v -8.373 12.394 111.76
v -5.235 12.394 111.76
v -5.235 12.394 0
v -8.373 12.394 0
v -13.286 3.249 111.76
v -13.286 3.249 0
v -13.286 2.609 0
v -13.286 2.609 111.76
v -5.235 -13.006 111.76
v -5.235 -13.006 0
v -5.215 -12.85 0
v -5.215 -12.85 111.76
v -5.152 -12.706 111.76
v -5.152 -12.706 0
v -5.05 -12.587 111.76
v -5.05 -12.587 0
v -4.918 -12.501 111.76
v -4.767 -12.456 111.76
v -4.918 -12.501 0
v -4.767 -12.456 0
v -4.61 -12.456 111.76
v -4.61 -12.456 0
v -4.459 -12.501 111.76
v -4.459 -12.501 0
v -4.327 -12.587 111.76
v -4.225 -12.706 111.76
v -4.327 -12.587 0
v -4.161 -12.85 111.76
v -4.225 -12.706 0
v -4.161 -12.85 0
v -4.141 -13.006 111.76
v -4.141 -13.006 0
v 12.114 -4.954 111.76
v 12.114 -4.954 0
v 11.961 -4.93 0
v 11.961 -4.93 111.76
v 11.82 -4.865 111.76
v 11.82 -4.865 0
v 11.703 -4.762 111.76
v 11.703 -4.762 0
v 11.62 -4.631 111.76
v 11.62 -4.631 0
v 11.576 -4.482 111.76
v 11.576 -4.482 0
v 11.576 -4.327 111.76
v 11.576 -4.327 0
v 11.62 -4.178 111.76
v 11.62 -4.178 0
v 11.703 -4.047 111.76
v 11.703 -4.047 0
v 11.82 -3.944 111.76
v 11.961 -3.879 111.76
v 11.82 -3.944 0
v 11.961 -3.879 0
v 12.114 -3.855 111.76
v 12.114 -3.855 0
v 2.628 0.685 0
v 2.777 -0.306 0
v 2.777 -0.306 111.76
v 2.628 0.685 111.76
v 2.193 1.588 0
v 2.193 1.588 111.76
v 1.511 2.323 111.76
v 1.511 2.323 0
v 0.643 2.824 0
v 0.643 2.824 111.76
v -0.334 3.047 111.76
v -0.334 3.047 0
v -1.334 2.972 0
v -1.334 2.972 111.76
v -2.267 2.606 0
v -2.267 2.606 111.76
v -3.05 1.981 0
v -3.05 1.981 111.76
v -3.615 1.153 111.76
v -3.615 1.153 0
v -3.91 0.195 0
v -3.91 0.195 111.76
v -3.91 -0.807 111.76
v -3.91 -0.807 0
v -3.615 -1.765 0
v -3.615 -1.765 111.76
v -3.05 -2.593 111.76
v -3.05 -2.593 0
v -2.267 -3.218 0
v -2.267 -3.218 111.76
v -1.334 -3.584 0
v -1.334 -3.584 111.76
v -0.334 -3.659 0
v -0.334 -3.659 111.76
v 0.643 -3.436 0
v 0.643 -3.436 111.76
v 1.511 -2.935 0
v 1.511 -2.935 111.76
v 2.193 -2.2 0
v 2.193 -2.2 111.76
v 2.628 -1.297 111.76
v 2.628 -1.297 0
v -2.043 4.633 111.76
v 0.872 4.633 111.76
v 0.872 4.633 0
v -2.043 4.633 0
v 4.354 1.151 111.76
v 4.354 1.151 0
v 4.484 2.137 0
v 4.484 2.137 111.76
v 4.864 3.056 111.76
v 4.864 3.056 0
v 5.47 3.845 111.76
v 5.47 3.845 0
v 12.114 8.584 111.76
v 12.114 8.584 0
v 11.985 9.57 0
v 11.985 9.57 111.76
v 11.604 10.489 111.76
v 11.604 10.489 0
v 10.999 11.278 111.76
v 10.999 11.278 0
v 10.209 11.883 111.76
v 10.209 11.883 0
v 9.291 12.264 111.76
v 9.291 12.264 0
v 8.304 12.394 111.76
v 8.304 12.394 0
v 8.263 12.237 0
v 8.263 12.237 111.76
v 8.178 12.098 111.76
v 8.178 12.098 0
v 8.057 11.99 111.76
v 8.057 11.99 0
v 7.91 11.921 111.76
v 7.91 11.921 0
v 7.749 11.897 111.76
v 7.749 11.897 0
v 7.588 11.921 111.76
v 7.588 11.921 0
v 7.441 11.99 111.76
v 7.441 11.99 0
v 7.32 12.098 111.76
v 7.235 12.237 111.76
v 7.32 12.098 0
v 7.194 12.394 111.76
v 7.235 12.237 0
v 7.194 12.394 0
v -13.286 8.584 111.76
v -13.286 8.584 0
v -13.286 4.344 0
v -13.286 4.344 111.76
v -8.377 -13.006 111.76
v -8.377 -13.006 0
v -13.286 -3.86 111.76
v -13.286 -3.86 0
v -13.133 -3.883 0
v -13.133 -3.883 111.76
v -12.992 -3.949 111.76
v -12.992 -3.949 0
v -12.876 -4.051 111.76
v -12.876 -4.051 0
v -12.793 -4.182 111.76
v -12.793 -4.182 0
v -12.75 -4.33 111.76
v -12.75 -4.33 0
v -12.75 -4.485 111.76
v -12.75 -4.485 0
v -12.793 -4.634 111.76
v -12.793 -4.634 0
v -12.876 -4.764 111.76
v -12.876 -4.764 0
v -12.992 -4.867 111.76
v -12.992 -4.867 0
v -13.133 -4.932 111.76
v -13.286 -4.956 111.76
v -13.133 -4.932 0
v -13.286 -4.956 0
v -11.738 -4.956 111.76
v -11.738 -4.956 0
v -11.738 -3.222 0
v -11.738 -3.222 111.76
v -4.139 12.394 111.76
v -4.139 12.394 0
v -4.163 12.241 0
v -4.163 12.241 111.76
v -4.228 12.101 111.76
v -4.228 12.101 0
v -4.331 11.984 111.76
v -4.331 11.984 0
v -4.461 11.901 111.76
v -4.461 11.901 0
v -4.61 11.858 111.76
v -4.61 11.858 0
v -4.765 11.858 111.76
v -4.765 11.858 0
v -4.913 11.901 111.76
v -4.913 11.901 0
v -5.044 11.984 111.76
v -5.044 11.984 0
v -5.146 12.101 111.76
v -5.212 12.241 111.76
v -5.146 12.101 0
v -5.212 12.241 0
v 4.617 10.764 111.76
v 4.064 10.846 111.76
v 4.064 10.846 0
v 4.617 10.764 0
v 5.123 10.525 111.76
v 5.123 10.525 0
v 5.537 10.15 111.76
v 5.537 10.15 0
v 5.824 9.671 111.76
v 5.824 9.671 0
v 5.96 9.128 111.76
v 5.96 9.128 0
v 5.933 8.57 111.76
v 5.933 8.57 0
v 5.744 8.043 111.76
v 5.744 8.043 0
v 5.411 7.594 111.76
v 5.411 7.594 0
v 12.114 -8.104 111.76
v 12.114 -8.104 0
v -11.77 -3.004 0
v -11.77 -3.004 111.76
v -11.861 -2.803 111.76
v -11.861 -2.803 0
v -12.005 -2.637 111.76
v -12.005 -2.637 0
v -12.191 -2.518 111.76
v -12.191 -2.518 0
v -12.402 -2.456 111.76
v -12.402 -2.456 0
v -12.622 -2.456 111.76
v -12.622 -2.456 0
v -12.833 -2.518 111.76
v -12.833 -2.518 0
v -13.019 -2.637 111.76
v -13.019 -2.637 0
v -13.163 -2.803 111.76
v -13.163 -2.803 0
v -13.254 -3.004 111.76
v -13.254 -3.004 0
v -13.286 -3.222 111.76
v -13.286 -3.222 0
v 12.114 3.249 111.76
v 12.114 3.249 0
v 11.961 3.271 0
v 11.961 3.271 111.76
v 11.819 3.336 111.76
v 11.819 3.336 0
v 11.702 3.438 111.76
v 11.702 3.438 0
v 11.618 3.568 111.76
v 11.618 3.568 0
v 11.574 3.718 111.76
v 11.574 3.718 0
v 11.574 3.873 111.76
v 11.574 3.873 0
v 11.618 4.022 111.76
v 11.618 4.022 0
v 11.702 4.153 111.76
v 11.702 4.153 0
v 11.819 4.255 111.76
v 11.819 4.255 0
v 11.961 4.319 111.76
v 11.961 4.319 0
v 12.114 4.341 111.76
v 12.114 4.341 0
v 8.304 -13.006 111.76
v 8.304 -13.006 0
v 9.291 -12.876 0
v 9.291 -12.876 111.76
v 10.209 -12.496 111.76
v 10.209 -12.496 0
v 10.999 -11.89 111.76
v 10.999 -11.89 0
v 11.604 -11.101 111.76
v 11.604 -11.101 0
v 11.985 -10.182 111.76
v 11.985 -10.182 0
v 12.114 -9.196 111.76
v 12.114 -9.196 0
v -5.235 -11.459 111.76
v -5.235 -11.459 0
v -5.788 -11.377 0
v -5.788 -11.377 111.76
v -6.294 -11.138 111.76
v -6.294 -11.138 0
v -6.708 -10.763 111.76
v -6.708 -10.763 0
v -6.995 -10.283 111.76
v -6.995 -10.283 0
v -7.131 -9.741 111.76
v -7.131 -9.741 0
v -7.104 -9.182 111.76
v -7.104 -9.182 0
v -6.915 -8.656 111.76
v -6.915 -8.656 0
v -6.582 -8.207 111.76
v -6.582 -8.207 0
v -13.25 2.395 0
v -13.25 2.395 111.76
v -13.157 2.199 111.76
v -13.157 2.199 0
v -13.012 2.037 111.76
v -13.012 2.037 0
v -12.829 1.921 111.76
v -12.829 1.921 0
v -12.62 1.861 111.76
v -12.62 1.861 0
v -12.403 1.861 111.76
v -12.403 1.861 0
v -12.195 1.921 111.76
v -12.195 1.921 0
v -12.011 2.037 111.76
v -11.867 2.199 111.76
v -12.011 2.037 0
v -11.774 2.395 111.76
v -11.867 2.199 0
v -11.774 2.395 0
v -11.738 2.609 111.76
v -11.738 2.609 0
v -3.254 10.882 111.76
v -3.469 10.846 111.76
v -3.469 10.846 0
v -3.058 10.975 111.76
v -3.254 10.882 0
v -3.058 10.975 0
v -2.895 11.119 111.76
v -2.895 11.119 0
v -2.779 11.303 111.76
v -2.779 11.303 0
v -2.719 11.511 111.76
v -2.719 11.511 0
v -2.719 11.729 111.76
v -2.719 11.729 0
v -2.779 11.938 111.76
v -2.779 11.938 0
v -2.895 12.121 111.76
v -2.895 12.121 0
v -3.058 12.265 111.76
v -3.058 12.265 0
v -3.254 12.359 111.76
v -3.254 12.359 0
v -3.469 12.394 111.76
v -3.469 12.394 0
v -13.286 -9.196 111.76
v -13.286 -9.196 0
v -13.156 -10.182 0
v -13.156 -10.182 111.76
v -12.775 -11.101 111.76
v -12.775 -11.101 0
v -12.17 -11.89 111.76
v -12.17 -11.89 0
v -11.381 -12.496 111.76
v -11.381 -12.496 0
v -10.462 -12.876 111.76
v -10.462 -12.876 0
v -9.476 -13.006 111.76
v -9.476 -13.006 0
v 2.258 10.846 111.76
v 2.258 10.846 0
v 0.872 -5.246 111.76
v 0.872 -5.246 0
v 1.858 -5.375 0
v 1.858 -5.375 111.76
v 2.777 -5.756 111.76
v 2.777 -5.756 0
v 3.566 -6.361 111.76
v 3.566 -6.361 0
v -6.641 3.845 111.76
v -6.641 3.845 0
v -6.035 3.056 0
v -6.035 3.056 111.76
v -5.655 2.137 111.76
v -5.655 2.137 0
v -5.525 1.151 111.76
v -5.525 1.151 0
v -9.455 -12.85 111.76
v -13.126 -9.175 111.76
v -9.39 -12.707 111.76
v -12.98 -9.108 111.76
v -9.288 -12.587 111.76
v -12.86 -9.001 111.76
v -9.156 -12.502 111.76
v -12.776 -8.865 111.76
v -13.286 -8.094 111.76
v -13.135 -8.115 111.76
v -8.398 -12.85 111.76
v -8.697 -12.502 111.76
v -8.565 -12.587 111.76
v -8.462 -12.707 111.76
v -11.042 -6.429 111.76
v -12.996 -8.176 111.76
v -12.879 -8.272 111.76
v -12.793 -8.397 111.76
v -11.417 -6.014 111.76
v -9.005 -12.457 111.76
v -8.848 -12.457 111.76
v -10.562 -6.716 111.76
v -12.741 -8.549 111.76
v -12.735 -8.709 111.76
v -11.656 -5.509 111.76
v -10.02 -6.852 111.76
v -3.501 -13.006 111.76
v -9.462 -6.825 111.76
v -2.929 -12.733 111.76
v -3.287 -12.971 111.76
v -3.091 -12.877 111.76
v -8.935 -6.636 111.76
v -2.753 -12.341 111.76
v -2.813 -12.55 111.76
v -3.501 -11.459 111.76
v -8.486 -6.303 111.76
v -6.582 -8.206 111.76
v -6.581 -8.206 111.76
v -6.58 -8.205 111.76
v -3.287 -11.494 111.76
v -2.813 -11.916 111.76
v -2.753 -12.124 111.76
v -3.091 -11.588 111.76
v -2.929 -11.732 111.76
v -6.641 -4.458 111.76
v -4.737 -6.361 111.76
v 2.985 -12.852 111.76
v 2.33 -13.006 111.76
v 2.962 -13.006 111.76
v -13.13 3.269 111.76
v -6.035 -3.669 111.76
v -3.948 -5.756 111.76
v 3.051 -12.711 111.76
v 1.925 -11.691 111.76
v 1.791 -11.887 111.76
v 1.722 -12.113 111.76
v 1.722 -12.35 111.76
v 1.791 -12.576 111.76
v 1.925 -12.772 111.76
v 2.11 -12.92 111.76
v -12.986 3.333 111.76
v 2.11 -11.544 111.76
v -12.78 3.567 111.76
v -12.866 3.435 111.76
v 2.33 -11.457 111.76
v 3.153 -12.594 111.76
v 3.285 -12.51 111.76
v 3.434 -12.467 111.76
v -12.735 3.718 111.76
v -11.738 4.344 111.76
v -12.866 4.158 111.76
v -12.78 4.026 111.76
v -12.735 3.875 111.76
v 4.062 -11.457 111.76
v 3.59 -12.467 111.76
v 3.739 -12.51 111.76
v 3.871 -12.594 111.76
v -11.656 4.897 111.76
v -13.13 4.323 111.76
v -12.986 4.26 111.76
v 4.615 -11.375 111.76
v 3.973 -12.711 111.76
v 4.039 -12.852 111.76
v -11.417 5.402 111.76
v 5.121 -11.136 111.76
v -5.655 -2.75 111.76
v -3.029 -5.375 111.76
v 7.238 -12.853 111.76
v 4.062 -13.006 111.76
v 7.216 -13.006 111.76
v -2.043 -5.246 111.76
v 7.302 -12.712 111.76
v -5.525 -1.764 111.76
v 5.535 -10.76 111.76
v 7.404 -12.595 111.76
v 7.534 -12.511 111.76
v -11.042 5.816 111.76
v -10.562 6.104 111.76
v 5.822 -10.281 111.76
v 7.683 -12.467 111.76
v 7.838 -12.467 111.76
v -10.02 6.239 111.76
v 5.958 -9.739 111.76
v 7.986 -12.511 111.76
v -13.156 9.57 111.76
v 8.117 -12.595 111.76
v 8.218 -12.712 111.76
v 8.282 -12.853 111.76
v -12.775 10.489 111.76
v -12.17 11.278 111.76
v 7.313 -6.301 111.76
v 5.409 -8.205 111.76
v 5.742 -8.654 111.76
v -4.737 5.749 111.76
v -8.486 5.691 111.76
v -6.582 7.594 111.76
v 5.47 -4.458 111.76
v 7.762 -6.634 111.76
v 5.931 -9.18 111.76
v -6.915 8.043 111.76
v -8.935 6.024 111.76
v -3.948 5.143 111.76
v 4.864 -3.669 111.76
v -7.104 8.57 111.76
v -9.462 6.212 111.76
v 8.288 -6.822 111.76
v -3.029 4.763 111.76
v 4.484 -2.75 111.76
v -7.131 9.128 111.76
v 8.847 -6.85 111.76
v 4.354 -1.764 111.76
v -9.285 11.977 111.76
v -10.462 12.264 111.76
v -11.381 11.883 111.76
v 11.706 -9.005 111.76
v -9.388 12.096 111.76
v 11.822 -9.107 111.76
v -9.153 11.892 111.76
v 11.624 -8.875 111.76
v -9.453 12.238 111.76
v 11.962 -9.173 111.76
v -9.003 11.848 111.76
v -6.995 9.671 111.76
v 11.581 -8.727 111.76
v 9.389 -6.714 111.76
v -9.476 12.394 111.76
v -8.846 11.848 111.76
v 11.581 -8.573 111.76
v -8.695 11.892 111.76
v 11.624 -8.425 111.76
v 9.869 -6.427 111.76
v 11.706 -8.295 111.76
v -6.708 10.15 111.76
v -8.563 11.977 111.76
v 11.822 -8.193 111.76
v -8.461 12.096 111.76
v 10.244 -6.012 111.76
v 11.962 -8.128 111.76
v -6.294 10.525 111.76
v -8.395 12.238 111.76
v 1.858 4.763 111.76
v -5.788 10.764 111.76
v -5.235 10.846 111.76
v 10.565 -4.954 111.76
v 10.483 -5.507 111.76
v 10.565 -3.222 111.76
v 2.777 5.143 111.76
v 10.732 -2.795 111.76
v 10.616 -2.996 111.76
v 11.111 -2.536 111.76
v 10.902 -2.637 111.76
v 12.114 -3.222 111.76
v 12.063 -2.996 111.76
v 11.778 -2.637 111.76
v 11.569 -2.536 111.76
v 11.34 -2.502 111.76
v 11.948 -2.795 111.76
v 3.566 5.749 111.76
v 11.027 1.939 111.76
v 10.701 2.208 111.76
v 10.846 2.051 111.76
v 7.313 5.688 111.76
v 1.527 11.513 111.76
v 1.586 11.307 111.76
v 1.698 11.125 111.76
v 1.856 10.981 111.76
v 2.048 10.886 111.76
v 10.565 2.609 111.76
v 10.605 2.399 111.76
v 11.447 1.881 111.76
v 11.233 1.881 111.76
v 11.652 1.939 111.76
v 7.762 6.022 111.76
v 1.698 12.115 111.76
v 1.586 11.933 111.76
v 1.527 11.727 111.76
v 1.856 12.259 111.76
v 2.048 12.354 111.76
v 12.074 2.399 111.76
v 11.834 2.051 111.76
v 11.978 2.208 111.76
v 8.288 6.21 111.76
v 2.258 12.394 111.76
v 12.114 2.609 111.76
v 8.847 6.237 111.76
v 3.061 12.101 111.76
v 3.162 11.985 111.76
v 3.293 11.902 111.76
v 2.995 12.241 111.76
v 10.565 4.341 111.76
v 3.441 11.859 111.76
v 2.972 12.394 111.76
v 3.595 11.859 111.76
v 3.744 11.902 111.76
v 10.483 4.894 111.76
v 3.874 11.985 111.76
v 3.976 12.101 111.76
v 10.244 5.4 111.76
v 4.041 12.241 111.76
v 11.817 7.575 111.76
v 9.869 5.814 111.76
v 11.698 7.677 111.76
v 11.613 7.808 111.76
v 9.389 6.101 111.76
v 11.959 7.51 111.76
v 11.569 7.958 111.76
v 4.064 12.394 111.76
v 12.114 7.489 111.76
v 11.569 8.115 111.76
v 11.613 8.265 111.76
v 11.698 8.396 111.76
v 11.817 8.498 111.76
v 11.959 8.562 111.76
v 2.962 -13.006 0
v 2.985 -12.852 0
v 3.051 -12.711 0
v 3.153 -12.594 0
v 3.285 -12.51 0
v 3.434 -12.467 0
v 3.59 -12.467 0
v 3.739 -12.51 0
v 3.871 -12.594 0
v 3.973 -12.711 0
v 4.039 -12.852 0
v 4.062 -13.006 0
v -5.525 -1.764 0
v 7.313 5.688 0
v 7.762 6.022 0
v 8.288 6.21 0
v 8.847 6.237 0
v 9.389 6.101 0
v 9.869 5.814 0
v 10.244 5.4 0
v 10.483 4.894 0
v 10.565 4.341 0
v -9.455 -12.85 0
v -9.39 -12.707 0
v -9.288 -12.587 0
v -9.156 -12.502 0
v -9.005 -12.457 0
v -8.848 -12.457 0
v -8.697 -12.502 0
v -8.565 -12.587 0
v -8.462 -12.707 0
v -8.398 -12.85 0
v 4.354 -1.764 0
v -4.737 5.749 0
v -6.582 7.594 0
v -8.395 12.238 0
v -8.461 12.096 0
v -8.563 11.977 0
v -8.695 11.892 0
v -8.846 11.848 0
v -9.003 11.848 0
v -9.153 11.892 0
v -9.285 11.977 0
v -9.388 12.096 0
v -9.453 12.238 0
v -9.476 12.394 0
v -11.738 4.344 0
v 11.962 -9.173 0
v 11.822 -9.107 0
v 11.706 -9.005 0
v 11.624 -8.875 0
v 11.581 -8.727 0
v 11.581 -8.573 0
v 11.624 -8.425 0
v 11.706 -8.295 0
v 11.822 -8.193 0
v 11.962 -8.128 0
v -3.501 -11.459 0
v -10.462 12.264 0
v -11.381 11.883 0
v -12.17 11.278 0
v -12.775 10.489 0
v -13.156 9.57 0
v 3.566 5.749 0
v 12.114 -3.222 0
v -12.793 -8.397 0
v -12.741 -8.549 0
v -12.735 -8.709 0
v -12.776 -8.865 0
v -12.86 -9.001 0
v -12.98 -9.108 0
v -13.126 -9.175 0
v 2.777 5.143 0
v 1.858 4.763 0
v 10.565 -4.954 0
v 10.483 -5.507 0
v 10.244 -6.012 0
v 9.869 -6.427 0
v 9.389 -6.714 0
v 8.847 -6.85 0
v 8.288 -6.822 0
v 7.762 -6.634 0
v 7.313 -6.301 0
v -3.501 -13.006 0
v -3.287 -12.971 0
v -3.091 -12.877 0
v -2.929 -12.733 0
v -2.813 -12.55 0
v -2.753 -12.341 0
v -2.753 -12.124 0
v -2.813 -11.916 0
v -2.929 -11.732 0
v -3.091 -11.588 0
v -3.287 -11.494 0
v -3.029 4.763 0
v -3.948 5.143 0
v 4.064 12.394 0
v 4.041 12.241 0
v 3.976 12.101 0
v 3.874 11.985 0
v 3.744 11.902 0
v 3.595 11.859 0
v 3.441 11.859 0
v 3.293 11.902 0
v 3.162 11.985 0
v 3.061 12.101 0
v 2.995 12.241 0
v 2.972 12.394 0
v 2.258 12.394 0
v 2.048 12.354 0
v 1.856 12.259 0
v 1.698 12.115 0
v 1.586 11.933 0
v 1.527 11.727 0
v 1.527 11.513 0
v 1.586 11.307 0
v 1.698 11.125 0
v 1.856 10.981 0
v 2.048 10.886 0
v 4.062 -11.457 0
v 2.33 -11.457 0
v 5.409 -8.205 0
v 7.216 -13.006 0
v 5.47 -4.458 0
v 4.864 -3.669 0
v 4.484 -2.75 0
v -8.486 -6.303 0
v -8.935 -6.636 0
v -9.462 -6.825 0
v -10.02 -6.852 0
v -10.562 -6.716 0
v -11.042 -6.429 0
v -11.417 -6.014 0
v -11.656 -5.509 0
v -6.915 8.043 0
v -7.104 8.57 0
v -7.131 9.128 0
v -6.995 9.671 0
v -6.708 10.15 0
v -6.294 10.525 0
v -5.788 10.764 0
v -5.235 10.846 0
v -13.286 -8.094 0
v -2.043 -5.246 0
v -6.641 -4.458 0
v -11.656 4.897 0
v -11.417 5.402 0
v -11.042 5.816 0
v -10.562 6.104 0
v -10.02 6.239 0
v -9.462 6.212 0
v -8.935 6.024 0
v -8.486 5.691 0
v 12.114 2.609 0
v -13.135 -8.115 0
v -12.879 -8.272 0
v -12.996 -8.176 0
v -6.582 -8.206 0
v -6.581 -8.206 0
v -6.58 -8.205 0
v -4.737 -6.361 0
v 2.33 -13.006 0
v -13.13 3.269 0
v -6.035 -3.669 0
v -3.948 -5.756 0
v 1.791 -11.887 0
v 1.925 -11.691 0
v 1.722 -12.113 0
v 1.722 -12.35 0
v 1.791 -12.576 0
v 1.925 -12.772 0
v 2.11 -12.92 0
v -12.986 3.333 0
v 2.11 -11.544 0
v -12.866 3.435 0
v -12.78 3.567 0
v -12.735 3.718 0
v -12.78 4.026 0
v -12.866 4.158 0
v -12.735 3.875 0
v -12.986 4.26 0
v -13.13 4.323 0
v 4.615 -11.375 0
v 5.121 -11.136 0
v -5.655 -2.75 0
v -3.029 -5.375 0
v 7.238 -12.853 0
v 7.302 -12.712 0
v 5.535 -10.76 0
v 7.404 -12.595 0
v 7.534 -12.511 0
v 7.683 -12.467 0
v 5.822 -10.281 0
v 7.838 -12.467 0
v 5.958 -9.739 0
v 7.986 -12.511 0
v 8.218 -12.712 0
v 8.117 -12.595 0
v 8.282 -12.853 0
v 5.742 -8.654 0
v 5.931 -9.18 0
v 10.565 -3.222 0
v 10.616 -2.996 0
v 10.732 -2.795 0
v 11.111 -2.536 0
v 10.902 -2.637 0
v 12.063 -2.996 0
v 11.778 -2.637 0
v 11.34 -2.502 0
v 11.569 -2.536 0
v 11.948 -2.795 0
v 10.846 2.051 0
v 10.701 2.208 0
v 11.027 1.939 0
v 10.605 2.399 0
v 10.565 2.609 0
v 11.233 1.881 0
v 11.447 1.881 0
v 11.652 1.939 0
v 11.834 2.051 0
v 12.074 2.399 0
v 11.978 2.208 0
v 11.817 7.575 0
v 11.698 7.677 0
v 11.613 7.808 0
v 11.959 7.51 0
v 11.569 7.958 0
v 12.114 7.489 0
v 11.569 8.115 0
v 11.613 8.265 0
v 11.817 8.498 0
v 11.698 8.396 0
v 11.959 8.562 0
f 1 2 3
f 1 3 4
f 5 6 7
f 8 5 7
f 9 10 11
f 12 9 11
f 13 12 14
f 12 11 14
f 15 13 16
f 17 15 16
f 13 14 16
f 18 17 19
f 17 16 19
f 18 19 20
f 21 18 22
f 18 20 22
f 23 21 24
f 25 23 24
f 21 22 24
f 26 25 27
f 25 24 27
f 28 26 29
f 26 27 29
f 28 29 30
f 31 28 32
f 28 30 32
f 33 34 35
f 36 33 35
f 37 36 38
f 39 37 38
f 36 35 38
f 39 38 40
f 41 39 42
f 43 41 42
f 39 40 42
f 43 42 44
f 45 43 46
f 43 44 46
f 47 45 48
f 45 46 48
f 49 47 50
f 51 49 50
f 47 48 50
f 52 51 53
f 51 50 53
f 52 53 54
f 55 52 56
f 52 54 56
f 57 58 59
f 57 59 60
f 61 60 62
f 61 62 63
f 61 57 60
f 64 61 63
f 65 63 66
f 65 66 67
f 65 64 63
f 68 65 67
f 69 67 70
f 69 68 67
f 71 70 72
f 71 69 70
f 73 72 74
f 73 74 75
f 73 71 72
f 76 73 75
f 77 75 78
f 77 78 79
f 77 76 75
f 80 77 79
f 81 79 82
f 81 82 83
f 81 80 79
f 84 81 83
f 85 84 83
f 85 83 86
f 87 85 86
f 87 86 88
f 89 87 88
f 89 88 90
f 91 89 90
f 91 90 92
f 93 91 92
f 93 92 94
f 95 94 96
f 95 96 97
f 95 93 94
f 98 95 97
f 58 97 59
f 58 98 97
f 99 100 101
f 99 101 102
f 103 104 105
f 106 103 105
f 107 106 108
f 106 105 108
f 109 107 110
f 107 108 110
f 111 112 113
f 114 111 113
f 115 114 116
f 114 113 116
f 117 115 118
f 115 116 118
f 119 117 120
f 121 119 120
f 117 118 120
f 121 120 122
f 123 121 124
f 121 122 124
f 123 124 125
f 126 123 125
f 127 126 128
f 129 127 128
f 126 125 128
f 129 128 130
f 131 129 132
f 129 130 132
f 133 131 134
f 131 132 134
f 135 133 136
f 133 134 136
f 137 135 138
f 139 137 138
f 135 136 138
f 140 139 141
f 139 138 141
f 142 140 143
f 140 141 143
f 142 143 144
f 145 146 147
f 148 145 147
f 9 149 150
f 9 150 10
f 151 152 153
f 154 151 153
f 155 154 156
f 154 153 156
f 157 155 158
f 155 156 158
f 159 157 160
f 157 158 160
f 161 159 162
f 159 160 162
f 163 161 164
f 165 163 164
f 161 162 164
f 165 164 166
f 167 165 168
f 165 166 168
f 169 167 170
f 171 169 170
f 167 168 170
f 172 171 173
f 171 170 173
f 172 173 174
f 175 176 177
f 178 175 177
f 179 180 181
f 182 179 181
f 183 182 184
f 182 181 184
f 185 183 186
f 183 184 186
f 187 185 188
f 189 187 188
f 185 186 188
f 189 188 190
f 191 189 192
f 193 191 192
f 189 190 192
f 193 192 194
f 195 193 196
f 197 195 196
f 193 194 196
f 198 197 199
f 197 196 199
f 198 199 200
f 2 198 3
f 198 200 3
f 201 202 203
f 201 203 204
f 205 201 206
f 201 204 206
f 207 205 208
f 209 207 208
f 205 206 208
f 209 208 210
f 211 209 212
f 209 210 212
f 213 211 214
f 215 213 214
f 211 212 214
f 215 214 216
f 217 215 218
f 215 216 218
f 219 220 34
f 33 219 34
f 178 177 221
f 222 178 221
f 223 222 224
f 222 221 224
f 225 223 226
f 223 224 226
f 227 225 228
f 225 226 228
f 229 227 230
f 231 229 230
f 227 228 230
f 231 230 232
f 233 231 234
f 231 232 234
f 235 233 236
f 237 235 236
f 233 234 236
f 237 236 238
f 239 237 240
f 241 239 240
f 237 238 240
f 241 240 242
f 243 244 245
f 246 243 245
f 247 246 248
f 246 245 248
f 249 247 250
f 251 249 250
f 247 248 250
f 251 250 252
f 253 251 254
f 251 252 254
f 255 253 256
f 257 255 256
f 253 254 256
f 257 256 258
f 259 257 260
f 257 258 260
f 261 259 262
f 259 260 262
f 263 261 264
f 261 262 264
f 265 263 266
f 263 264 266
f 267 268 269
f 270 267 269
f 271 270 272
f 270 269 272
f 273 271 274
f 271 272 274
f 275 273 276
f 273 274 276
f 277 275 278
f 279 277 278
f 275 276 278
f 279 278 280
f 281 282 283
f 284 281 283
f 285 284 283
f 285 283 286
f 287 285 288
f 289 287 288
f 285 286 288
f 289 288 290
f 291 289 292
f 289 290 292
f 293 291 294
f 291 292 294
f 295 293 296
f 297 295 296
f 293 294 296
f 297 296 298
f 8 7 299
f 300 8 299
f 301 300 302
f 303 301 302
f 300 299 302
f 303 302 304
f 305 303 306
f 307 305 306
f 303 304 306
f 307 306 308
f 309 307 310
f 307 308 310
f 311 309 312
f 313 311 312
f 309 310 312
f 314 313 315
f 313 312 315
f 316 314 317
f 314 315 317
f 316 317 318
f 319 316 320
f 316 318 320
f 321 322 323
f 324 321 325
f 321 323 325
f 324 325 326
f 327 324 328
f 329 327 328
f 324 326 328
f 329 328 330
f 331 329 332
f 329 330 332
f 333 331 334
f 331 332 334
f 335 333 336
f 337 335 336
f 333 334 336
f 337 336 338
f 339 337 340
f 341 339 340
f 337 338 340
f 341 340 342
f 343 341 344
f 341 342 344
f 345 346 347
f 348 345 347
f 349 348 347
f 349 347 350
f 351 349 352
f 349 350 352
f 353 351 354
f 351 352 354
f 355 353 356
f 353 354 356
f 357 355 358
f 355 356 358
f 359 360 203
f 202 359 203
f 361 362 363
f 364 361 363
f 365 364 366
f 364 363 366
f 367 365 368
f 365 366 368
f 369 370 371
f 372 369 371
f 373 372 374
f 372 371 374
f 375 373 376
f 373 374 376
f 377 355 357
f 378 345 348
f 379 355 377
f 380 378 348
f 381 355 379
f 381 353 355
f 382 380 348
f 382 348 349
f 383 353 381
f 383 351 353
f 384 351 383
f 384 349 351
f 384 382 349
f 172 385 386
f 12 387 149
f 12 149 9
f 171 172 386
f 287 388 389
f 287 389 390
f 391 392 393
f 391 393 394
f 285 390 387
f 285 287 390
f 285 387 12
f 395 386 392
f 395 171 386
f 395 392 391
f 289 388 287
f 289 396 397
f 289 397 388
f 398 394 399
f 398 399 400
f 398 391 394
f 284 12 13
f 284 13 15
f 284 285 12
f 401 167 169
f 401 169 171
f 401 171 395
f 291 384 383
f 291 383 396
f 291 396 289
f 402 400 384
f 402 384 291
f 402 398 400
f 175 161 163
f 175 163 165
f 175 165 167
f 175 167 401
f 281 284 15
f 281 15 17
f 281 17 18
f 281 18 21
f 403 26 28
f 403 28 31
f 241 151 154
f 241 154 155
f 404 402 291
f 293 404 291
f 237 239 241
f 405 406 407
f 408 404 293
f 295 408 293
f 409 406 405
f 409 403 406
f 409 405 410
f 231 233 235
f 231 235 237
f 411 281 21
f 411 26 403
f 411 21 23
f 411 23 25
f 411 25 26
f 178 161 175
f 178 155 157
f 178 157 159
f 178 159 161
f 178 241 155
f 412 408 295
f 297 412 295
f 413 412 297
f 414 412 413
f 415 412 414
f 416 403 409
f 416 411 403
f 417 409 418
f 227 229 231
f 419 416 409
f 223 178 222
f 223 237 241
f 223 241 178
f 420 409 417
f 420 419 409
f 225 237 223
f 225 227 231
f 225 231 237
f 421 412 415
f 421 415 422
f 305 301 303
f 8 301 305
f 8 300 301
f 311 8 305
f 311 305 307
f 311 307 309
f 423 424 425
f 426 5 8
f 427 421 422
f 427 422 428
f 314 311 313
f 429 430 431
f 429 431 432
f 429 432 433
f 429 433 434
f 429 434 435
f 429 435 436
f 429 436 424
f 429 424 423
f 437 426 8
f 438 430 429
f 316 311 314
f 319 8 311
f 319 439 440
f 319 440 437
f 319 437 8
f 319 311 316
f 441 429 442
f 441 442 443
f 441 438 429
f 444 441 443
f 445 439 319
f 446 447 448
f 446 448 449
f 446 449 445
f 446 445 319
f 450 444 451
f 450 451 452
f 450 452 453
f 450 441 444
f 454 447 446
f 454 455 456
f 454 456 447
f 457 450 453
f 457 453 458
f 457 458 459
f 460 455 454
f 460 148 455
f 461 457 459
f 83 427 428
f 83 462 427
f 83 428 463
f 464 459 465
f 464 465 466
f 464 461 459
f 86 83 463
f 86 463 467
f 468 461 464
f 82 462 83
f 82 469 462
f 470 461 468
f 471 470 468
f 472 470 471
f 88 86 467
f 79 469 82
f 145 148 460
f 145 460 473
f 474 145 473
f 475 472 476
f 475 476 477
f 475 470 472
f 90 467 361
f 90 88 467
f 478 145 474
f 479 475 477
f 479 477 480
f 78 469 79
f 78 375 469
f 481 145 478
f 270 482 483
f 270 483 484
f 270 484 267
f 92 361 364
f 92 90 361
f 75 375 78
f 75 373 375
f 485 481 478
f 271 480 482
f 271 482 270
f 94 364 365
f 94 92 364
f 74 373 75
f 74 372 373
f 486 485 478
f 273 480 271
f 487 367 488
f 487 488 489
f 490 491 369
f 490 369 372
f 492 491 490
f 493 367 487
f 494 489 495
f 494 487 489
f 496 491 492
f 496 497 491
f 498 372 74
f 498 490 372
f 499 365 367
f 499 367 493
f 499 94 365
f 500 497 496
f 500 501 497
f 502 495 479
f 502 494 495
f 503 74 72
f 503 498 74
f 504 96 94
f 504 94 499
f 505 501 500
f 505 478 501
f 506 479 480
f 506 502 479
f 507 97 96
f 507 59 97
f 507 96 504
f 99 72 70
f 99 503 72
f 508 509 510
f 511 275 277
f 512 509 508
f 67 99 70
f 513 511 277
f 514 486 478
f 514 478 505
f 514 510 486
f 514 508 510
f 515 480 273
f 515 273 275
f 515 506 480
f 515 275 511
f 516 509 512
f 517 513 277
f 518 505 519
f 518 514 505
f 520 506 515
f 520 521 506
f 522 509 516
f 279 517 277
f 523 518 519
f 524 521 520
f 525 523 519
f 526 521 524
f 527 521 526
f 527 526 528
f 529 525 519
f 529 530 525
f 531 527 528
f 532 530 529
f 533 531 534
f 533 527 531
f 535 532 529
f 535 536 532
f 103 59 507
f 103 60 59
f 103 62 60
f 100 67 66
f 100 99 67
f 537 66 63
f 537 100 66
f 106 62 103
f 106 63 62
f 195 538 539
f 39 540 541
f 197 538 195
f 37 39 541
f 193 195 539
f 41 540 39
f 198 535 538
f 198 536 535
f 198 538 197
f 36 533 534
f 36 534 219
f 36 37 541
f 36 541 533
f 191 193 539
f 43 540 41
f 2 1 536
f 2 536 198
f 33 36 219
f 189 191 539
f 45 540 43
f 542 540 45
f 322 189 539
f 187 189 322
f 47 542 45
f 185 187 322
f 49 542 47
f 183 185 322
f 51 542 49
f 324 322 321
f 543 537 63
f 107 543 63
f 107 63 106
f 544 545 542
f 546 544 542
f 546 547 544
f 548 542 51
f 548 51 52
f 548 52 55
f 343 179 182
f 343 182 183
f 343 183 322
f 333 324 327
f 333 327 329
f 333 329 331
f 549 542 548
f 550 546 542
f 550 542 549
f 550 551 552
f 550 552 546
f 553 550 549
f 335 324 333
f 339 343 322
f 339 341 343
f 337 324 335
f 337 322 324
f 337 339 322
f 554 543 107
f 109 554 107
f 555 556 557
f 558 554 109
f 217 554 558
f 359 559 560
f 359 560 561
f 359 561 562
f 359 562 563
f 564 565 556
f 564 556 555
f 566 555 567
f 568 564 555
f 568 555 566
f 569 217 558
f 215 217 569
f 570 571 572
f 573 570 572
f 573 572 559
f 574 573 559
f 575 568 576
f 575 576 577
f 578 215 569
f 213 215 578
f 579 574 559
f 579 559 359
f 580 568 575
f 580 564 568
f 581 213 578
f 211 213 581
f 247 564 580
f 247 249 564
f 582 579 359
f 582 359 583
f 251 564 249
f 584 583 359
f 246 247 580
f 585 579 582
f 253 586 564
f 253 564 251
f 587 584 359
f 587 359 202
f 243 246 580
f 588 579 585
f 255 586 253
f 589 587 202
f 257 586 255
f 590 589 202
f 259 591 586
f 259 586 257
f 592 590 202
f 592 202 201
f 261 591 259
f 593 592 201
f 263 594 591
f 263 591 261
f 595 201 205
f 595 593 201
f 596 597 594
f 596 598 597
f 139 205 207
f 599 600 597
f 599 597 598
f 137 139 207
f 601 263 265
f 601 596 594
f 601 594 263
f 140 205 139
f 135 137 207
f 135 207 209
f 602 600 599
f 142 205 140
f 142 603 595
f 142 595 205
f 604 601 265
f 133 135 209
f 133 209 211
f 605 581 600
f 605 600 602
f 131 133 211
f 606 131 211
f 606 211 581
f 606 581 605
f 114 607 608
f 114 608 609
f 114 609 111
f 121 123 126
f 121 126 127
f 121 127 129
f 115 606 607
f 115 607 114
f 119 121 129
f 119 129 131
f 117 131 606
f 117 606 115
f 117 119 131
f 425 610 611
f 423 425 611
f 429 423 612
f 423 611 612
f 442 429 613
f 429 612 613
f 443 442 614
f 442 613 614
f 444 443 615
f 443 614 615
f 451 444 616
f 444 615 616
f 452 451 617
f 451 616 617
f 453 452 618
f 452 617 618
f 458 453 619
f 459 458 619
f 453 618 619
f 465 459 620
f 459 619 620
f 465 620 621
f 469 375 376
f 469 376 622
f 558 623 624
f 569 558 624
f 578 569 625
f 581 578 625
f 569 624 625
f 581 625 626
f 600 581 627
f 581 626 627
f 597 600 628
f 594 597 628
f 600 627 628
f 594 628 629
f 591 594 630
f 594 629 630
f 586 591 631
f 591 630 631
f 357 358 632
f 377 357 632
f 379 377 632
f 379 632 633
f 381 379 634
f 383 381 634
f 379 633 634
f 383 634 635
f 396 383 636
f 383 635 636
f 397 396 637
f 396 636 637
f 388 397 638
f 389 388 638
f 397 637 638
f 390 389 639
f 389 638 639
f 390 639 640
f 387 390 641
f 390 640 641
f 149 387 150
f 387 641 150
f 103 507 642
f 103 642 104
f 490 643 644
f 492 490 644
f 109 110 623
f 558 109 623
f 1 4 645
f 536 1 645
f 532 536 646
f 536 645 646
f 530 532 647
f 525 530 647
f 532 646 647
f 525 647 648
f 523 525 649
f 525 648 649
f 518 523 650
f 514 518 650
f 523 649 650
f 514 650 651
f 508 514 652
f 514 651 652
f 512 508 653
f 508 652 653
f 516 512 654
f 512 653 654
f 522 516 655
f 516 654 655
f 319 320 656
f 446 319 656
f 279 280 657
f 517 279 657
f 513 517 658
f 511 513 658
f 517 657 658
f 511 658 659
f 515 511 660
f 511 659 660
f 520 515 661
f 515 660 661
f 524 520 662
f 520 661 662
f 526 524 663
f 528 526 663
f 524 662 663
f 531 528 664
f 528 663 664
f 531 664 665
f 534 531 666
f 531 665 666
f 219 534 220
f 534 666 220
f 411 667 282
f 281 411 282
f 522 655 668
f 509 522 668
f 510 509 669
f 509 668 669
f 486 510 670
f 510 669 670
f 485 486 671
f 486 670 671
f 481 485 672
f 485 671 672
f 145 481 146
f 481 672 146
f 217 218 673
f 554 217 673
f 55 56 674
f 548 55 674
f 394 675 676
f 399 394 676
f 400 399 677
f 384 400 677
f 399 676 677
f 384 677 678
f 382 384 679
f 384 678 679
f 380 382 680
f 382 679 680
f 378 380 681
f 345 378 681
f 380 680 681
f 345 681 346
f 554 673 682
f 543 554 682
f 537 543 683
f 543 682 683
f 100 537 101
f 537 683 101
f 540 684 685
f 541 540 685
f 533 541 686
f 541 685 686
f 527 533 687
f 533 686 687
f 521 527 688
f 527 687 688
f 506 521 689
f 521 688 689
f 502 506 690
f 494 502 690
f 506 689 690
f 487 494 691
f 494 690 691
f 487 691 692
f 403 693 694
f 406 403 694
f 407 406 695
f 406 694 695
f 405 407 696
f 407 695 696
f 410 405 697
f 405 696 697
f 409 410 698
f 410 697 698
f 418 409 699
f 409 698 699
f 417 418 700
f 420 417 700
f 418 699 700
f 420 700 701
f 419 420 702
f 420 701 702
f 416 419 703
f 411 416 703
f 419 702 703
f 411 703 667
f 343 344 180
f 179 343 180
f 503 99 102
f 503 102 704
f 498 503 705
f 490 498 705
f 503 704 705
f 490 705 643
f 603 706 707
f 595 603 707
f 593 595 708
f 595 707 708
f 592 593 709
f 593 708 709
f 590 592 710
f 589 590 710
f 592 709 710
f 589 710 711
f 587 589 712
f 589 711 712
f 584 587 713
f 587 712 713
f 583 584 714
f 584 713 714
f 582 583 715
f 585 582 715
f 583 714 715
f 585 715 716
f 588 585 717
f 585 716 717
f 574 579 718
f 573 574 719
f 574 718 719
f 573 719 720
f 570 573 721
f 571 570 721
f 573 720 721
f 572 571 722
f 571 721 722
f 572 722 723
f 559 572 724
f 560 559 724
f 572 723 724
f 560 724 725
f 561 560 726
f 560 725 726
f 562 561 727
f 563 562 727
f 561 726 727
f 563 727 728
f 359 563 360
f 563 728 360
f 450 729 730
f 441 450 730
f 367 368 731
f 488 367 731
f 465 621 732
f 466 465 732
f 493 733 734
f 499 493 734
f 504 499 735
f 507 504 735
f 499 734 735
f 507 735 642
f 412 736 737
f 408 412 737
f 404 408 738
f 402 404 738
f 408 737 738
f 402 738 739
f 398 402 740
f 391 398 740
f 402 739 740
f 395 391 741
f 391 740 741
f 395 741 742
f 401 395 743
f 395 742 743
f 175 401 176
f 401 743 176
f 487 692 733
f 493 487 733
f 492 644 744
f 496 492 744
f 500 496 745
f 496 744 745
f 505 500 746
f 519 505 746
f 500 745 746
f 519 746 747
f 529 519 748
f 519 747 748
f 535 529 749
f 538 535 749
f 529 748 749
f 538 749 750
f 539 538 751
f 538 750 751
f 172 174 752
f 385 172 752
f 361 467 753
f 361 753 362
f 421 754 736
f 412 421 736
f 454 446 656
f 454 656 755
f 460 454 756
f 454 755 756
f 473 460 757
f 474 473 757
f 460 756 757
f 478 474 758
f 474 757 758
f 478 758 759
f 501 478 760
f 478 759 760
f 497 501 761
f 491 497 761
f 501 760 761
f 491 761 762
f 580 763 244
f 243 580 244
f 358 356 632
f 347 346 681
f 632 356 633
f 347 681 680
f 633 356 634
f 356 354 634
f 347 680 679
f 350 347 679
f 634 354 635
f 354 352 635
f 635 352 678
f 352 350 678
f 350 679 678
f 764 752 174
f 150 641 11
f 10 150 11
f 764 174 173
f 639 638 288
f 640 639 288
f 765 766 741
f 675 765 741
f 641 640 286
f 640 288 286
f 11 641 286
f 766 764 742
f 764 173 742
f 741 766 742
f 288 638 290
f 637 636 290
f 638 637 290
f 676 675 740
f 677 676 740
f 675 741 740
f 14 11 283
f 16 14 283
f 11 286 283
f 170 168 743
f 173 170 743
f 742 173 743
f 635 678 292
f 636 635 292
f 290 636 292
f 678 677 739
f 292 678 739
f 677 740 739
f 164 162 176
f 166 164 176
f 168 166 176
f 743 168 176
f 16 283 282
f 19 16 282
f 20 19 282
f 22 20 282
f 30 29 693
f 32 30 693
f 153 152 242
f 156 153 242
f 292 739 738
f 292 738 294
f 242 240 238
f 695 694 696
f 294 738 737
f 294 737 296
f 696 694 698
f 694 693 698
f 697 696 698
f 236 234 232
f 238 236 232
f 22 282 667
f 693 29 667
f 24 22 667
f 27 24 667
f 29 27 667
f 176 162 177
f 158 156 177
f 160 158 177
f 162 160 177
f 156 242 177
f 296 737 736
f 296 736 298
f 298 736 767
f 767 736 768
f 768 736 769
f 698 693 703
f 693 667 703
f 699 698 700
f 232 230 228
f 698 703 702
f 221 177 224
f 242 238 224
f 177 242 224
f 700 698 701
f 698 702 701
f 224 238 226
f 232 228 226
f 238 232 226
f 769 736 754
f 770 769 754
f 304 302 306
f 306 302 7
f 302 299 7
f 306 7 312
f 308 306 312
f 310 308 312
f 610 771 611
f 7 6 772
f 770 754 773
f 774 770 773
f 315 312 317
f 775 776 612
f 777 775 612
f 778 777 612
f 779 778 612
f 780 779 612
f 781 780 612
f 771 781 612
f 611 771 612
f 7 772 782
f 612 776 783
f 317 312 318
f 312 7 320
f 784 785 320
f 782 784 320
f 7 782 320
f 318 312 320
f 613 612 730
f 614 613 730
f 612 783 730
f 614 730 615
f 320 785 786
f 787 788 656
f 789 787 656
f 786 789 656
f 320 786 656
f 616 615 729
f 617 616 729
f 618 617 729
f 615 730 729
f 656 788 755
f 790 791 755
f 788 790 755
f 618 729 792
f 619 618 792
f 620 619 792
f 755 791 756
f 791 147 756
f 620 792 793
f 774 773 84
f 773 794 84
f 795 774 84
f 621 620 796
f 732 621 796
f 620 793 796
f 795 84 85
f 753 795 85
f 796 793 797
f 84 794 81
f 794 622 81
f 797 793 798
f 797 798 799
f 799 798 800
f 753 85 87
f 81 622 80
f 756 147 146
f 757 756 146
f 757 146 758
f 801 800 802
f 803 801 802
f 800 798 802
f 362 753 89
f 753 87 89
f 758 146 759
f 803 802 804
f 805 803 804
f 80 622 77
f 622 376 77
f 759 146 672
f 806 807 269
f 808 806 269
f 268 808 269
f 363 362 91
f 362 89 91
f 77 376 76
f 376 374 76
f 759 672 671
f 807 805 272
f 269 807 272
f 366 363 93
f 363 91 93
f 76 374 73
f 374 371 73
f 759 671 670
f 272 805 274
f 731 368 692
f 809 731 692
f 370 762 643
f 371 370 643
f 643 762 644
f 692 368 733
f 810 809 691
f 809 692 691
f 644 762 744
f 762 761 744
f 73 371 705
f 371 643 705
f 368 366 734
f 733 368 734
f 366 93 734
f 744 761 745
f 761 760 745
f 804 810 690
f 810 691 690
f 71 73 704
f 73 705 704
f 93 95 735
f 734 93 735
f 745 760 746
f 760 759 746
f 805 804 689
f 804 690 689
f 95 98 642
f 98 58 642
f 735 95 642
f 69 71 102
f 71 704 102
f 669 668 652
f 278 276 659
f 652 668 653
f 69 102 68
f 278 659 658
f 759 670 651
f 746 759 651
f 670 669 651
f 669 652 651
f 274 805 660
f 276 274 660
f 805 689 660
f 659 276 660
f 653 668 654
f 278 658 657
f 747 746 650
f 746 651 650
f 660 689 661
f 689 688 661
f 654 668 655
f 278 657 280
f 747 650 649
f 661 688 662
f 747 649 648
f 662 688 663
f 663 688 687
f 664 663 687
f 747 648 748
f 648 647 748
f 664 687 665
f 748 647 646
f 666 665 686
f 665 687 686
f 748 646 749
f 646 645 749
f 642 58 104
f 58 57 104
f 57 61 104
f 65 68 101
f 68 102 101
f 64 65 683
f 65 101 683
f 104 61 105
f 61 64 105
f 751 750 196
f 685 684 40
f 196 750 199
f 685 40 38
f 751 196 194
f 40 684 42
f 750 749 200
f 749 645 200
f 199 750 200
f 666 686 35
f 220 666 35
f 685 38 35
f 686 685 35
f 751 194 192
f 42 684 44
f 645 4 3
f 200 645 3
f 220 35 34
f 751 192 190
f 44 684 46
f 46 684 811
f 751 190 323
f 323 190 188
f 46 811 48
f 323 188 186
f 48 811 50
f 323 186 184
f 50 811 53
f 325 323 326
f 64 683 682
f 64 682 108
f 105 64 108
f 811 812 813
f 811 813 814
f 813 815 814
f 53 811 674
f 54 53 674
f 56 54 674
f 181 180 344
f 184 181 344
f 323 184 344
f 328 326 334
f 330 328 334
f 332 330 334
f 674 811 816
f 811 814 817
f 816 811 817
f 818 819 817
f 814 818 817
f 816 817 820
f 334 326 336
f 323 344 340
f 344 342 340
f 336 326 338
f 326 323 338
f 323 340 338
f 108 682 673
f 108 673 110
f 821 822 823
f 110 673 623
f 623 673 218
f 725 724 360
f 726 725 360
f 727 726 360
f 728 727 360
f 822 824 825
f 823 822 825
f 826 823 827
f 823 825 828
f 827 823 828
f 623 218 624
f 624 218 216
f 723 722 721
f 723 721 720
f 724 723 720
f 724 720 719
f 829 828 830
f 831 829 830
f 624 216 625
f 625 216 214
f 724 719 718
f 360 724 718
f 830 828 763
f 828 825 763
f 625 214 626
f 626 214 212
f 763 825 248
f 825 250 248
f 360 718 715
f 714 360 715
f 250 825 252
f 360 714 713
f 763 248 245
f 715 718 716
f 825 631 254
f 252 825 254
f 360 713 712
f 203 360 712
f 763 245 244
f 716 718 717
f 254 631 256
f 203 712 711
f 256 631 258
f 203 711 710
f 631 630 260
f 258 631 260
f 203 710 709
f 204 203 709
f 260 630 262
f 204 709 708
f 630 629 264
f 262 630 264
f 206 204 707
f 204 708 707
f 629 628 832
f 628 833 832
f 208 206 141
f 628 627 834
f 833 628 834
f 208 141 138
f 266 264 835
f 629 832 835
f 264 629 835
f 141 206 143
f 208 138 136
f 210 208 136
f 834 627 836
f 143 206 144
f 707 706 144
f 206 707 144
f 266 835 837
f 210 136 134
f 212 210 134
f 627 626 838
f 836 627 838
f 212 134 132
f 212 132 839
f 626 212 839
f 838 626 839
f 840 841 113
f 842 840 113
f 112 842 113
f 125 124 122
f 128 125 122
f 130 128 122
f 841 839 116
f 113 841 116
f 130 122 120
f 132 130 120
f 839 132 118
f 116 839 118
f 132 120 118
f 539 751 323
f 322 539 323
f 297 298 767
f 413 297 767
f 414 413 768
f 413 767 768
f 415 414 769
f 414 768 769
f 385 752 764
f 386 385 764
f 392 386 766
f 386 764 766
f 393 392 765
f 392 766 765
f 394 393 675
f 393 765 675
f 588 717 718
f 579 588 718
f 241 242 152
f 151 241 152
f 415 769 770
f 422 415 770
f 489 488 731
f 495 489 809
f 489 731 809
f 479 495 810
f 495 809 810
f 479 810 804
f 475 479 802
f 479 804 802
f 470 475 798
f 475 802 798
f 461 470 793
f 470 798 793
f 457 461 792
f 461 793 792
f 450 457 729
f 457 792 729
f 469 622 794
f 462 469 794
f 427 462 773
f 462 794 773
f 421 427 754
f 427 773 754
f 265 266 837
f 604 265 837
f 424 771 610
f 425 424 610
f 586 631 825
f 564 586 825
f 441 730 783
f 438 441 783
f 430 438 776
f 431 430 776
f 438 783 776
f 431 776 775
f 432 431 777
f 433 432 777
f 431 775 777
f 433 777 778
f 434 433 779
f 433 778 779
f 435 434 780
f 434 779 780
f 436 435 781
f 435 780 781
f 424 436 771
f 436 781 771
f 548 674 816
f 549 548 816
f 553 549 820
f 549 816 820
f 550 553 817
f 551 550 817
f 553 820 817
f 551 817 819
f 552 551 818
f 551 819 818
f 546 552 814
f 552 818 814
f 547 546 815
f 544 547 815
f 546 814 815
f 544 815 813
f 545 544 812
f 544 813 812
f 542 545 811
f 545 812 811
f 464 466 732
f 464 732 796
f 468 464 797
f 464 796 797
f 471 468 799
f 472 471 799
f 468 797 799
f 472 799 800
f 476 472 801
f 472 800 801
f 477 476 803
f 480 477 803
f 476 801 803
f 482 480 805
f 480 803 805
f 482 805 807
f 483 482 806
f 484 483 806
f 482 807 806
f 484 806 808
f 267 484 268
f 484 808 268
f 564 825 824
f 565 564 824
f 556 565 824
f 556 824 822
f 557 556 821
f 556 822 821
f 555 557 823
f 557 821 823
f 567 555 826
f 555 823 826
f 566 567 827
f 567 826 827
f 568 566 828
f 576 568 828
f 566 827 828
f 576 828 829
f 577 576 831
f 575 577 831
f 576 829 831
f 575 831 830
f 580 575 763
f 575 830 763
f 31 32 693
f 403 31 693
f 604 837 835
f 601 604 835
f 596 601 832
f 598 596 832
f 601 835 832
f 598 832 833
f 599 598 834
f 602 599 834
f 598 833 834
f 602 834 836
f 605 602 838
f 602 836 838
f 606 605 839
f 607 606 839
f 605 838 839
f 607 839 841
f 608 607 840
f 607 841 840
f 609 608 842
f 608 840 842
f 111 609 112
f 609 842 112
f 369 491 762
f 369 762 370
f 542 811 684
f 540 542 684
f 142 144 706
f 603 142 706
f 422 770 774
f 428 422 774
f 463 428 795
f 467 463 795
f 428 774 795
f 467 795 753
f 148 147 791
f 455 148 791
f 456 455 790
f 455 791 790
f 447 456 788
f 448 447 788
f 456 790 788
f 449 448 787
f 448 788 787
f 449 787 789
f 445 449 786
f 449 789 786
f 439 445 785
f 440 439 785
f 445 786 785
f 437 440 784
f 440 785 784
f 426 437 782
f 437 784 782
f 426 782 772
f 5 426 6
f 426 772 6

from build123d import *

# Parameters (mm, degrees)
F0_R     = 3.3625011168
F1_DEPTH = 111.76


# Not quite as in the source:
# - ends of sketch curves that miss each other by under 0.0002 mm in the source are joined


with BuildPart() as f1:
    # F0 (on Top) → F1 (new body)
    with BuildSketch(Plane.XY):
        with BuildLine():
            ThreePointArc((3.5659002011, 5.7489795053), (2.3298472421, 4.9230753228), (0.8718233648, 4.6330563417))
            Line((0.8718233648, 4.6330563417), (-2.0428700475, 4.6330563417))
            ThreePointArc((-2.0428700475, 4.6330563417), (-3.5008939248, 4.9230753228), (-4.7369468838, 5.7489795053))
            Line((-4.7369468838, 5.7489795053), (-6.5824285393, 7.5944611609))
            ThreePointArc((-6.5824285393, 7.5944611609), (-6.9953806306, 9.6705115177), (-5.2353901211, 10.846499579))
            Line((-5.2353901211, 10.846499579), (-3.5008939248, 10.846499579))
            Line((-3.5008939248, 10.846499579), (-3.4685428807, 10.846499579))
            ThreePointArc((-3.4685428807, 10.846499579), (-2.7109282724, 11.6201206221), (-3.4685428807, 12.3937416652))
            Line((-3.4685428807, 12.3937416652), (-3.5008939248, 12.3937416652))
            Line((-3.5008939248, 12.3937416652), (-4.1388643307, 12.3937416652))
            ThreePointArc((-4.1388643307, 12.3937416652), (-4.6871272259, 11.8525139305), (-5.2353901211, 12.3937416652))
            Line((-5.2353901211, 12.3937416652), (-8.3730050695, 12.3937416652))
            ThreePointArc((-8.3730050695, 12.3937416652), (-8.9242642054, 11.8424825293), (-9.4755233413, 12.3937416652))
            ThreePointArc((-9.4755233413, 12.3937416652), (-12.1696001777, 11.2778185015), (-13.2855233413, 8.5837416652))
            Line((-13.2855233413, 8.5837416652), (-13.2855233413, 7.4984658996))
            Line((-13.2855233413, 7.4984658996), (-13.2855233413, 4.343608445))
            ThreePointArc((-13.2855233413, 4.343608445), (-12.7296839168, 3.7964165708), (-13.2855233413, 3.2492246965))
            Line((-13.2855233413, 3.2492246965), (-13.2855233413, 2.6091122487))
            ThreePointArc((-13.2855233413, 2.6091122487), (-12.5119022982, 1.8532957784), (-11.7382812551, 2.6091122487))
            Line((-11.7382812551, 2.6091122487), (-11.7382812551, 4.343608445))
            ThreePointArc((-11.7382812551, 4.343608445), (-10.5622931938, 6.1035989545), (-8.486242837, 5.6906468632))
            Line((-8.486242837, 5.6906468632), (-6.6407611815, 3.8451652077))
            ThreePointArc((-6.6407611815, 3.8451652077), (-5.8148569989, 2.6091122487), (-5.5248380178, 1.1510883714))
            Line((-5.5248380178, 1.1510883714), (-5.5248380178, -1.7636050409))
            ThreePointArc((-5.5248380178, -1.7636050409), (-5.8148569989, -3.2216289182), (-6.6407611815, -4.4576818772))
            Line((-6.6407611815, -4.4576818772), (-8.486242837, -6.3031635328))
            ThreePointArc((-8.486242837, -6.3031635328), (-10.5622931938, -6.716115624), (-11.7382812551, -4.9561251146))
            Line((-11.7382812551, -4.9561251146), (-11.7382812551, -3.2216289182))
            ThreePointArc((-11.7382812551, -3.2216289182), (-12.5119022982, -2.4480078751), (-13.2855233413, -3.2216289182))
            Line((-13.2855233413, -3.2216289182), (-13.2855233413, -3.8570189362))
            Line((-13.2855233413, -3.8570189362), (-13.2855233413, -3.8595993241))
            ThreePointArc((-13.2855233413, -3.8595993241), (-12.7442956066, -4.4078622194), (-13.2855233413, -4.9561251146))
            Line((-13.2855233413, -4.9561251146), (-13.2855233413, -8.093740063))
            ThreePointArc((-13.2855233413, -8.093740063), (-12.9963771793, -8.175658031), (-12.7931661592, -8.3970656592))
            ThreePointArc((-12.7931661592, -8.3970656592), (-12.8130701183, -8.9360625991), (-13.2855233413, -9.1962583348))
            ThreePointArc((-13.2855233413, -9.1962583348), (-12.1696001777, -11.8903351711), (-9.4755233413, -13.0062583348))
            ThreePointArc((-9.4755233413, -13.0062583348), (-8.9263401234, -12.4513735034), (-8.3771569056, -13.0062583348))
            Line((-8.3771569056, -13.0062583348), (-5.2353901211, -13.0062583348))
            ThreePointArc((-5.2353901211, -13.0062583348), (-4.6881982469, -12.4504189103), (-4.1410063726, -13.0062583348))
            Line((-4.1410063726, -13.0062583348), (-3.5008939248, -13.0062583348))
            ThreePointArc((-3.5008939248, -13.0062583348), (-2.7450774545, -12.2326372917), (-3.5008939248, -11.4590162486))
            Line((-3.5008939248, -11.4590162486), (-5.2353901211, -11.4590162486))
            ThreePointArc((-5.2353901211, -11.4590162486), (-6.9953806306, -10.2830281872), (-6.5824285393, -8.2069778304))
            ThreePointArc((-6.5824285393, -8.2069778304), (-6.5813491493, -8.2058993046), (-6.5802706255, -8.2048199166))
            Line((-6.5802706255, -8.2048199166), (-4.7369468838, -6.3614961749))
            ThreePointArc((-4.7369468838, -6.3614961749), (-3.5008939248, -5.5355919924), (-2.0428700475, -5.2455730112))
            Line((-2.0428700475, -5.2455730112), (0.8718233648, -5.2455730112))
            ThreePointArc((0.8718233648, -5.2455730112), (2.3298472421, -5.5355919924), (3.5659002011, -6.3614961749))
            Line((3.5659002011, -6.3614961749), (5.4092239428, -8.2048199166))
            ThreePointArc((5.4092239428, -8.2048199166), (5.8221760341, -10.2808702734), (4.0621855247, -11.4568583348))
            Line((4.0621855247, -11.4568583348), (2.3298472421, -11.4568583348))
            ThreePointArc((2.3298472421, -11.4568583348), (1.7126411358, -12.2315583348), (2.3298472421, -13.0062583348))
            Line((2.3298472421, -13.0062583348), (2.9616088274, -13.0062583348))
            ThreePointArc((2.9616088274, -13.0062583348), (3.511897176, -12.460996221), (4.0621855247, -13.0062583348))
            Line((4.0621855247, -13.0062583348), (7.2156104858, -13.0062583348))
            ThreePointArc((7.2156104858, -13.0062583348), (7.7600435722, -12.4618252483), (8.3044766587, -13.0062583348))
            ThreePointArc((8.3044766587, -13.0062583348), (10.998553495, -11.8903351711), (12.1144766587, -9.1962583348))
            ThreePointArc((12.1144766587, -9.1962583348), (11.5750962663, -8.6501583348), (12.1144766587, -8.1040583348))
            Line((12.1144766587, -8.1040583348), (12.1144766587, -4.9539672008))
            ThreePointArc((12.1144766587, -4.9539672008), (11.570959409, -4.4045980675), (12.1144766587, -3.8552289343))
            Line((12.1144766587, -3.8552289343), (12.1144766587, -3.2216289182))
            ThreePointArc((12.1144766587, -3.2216289182), (11.3397766587, -2.5015675684), (10.5650766587, -3.2216289182))
            Line((10.5650766587, -3.2216289182), (10.5650766587, -4.9539672008))
            ThreePointArc((10.5650766587, -4.9539672008), (9.3890885973, -6.7139577102), (7.3130382405, -6.301005619))
            Line((7.3130382405, -6.301005619), (5.4697144988, -4.4576818772))
            ThreePointArc((5.4697144988, -4.4576818772), (4.6438103163, -3.2216289182), (4.3537913351, -1.7636050409))
            Line((4.3537913351, -1.7636050409), (4.3537913351, 1.1510883714))
            ThreePointArc((4.3537913351, 1.1510883714), (4.6438103163, 2.6091122487), (5.4697144988, 3.8451652077))
            Line((5.4697144988, 3.8451652077), (7.3130382405, 5.6884889494))
            ThreePointArc((7.3130382405, 5.6884889494), (9.3890885973, 6.1014410407), (10.5650766587, 4.3414505312))
            Line((10.5650766587, 4.3414505312), (10.5650766587, 2.6091122487))
            ThreePointArc((10.5650766587, 2.6091122487), (11.3397766587, 1.8731471479), (12.1144766587, 2.6091122487))
            Line((12.1144766587, 2.6091122487), (12.1144766587, 3.2492505312))
            ThreePointArc((12.1144766587, 3.2492505312), (11.5683766587, 3.7953505312), (12.1144766587, 4.3414505312))
            Line((12.1144766587, 4.3414505312), (12.1144766587, 7.4889068047))
            ThreePointArc((12.1144766587, 7.4889068047), (11.563421032, 8.0363242349), (12.1144766587, 8.5837416652))
            ThreePointArc((12.1144766587, 8.5837416652), (10.998553495, 11.2778185015), (8.3044766587, 12.3937416652))
            ThreePointArc((8.3044766587, 12.3937416652), (7.7491737928, 11.89736095), (7.1938709268, 12.3937416652))
            Line((7.1938709268, 12.3937416652), (4.0643434385, 12.3937416652))
            ThreePointArc((4.0643434385, 12.3937416652), (3.5181119113, 11.8531747523), (2.9718803841, 12.3937416652))
            Line((2.9718803841, 12.3937416652), (2.3298472421, 12.3937416652))
            Line((2.3298472421, 12.3937416652), (2.2582739116, 12.3937416652))
            ThreePointArc((2.2582739116, 12.3937416652), (1.5196122547, 11.6201206221), (2.2582739116, 10.846499579))
            Line((2.2582739116, 10.846499579), (2.3298472421, 10.846499579))
            Line((2.3298472421, 10.846499579), (4.0643434385, 10.846499579))
            ThreePointArc((4.0643434385, 10.846499579), (5.8243339479, 9.6705115177), (5.4113818566, 7.5944611609))
            Line((5.4113818566, 7.5944611609), (3.5659002011, 5.7489795053))
        make_face()
        with Locations((-0.5855233413, -0.3062583348)):
            Circle(F0_R, mode=Mode.SUBTRACT)
    extrude(amount=F1_DEPTH)


solid = f1.part
